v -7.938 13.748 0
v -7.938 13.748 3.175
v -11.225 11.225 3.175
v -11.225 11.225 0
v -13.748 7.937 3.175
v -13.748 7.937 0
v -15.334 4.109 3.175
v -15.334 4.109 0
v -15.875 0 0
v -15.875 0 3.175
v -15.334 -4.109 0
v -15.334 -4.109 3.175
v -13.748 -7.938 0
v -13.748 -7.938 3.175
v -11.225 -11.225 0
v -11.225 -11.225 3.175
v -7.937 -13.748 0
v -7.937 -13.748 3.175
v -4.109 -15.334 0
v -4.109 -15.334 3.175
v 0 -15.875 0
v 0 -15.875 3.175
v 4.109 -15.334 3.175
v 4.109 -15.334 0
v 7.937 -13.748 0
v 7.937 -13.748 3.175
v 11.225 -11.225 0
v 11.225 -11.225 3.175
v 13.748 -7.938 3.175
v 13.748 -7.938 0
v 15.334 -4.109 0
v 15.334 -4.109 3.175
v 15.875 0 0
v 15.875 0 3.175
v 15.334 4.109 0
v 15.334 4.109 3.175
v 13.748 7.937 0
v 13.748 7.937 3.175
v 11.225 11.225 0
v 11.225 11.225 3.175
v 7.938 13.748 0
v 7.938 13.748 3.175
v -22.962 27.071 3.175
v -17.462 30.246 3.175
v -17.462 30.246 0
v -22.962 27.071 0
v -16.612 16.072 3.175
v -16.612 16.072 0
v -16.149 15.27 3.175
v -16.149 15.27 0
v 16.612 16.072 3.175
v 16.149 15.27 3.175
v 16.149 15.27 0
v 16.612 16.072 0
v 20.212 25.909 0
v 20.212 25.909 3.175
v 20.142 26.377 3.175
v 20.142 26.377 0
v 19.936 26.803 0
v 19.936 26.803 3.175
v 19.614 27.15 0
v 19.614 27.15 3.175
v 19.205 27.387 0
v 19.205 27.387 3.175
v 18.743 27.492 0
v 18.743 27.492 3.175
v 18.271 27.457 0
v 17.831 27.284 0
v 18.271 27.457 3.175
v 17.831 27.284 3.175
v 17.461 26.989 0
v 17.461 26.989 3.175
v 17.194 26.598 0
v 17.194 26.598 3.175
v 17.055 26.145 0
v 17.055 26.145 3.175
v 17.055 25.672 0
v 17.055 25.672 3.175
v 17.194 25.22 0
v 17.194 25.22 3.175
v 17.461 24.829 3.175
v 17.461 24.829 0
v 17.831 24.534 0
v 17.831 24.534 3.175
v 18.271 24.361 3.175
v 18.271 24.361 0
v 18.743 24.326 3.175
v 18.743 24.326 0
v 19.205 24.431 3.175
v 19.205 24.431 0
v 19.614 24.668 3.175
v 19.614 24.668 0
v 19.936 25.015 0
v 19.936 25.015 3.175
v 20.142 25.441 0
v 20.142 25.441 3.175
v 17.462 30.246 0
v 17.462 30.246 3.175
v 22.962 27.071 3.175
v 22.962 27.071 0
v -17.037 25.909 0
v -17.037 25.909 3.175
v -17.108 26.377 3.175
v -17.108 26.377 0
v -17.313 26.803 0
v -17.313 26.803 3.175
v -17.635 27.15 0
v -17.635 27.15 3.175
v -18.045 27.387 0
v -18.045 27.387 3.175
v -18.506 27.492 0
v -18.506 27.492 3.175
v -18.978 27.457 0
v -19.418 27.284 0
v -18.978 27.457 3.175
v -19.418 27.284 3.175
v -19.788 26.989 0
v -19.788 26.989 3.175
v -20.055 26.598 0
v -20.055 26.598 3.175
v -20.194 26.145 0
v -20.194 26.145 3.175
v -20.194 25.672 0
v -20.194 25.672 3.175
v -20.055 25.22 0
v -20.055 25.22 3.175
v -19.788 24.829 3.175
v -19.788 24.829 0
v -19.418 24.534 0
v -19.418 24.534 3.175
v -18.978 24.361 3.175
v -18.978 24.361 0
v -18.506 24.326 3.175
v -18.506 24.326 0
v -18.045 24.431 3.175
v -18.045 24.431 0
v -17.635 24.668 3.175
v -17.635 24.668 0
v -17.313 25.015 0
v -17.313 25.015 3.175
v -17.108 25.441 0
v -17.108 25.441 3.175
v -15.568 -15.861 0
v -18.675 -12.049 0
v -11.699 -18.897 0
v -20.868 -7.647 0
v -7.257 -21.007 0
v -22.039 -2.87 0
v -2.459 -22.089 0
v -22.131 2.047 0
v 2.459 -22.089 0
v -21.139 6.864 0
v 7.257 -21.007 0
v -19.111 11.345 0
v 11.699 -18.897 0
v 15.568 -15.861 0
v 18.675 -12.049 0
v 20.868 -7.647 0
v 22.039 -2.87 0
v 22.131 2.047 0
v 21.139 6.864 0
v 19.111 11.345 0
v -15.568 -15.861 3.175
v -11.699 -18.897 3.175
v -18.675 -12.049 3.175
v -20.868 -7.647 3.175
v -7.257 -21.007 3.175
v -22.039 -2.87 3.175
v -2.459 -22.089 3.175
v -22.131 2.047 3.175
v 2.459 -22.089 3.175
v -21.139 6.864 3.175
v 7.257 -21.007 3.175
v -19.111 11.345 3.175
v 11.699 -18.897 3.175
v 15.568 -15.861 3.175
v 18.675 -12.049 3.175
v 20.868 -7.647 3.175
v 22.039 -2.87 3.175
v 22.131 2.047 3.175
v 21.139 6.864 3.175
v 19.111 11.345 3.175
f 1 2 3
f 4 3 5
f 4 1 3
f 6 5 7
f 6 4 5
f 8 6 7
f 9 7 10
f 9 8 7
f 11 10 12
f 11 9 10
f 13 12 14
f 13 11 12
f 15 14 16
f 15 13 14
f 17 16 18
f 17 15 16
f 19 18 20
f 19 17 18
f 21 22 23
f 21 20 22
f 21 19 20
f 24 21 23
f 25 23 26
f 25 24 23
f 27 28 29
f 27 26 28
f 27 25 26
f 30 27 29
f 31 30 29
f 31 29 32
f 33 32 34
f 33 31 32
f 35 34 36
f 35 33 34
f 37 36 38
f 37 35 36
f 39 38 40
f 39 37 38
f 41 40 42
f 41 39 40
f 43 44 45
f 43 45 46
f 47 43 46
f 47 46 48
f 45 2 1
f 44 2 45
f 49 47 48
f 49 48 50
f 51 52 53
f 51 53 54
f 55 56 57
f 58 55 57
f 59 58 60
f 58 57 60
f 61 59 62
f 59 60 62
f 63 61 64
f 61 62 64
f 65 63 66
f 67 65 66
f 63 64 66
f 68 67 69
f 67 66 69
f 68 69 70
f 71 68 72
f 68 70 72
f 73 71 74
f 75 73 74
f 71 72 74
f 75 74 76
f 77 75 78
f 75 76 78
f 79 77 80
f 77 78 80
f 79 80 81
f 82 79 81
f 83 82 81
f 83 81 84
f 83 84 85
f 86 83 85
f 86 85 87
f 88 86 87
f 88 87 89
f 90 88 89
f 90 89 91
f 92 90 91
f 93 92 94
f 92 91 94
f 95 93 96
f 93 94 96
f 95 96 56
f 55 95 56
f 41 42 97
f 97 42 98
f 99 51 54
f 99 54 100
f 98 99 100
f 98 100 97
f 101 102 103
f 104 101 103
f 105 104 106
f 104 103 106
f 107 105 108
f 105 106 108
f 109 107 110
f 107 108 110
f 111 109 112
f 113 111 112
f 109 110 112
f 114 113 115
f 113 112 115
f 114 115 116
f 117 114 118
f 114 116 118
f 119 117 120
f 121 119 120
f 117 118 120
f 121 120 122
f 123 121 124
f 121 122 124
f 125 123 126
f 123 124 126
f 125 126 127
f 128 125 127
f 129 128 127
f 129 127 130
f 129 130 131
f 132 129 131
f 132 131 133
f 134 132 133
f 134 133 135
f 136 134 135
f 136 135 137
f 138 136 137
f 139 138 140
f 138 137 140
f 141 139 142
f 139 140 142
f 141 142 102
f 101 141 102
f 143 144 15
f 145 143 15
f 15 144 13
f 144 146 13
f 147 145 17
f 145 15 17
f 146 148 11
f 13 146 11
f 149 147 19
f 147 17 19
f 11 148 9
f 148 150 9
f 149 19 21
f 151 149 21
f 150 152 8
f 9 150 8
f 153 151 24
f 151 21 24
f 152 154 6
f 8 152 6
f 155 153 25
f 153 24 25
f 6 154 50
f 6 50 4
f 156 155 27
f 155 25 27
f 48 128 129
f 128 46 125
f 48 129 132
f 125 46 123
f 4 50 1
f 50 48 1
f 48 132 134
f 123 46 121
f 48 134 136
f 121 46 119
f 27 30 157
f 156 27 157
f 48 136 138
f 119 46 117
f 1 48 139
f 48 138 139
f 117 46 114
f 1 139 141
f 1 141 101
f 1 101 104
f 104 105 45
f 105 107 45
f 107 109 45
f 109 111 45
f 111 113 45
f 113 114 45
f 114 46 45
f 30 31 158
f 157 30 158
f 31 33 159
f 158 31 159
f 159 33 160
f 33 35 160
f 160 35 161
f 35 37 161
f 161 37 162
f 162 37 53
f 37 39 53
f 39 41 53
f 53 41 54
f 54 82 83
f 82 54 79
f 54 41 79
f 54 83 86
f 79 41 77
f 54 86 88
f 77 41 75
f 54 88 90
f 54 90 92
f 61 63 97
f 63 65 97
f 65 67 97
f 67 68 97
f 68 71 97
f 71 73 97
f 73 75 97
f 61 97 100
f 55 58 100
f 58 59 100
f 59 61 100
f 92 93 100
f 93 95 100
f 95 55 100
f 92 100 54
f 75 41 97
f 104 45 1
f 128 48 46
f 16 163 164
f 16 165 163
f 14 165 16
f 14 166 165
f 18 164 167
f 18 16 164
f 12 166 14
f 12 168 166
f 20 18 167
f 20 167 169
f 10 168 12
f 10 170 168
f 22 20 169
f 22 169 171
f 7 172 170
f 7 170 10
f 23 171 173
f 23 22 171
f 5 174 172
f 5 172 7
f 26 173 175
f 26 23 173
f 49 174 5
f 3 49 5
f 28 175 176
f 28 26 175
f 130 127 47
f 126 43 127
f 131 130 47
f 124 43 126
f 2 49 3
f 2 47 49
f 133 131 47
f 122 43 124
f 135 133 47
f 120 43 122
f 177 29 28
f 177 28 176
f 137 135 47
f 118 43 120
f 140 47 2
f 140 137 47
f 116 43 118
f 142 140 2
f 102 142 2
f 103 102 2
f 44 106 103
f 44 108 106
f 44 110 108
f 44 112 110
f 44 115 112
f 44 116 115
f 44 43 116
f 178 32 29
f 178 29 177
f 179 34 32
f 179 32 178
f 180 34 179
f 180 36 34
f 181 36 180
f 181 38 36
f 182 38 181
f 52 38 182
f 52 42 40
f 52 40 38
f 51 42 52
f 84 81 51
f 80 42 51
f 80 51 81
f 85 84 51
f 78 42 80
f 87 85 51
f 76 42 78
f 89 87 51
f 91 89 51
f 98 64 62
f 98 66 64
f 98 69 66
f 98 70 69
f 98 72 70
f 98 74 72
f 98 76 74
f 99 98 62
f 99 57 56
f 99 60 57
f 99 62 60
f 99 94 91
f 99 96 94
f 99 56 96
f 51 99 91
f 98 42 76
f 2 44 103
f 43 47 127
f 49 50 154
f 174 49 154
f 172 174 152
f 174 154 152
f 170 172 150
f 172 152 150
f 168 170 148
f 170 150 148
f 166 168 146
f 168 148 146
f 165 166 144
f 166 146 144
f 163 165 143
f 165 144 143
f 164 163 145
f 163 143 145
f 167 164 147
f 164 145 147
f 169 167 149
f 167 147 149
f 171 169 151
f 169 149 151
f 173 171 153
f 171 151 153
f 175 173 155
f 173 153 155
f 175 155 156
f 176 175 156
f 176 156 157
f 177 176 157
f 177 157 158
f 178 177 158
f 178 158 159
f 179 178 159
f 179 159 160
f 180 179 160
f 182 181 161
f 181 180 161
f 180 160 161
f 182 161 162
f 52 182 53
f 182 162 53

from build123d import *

# Parameters (mm, degrees)
SKETCH2_R           = 22.225
SKETCH2_R_2         = 19.05
SKETCH2_R_3         = 15.875
BOSS_EXTRUDE1_DEPTH = 3.175
SKETCH3_R           = 1.5875
BOSS_EXTRUDE2_DEPTH = 3.175
CUT_EXTRUDE1_DEPTH  = 3.175


with BuildPart() as part:
    # Sketch2 → Boss-Extrude1 (new body)
    with BuildSketch(Plane.XY):
        Circle(SKETCH2_R)
        Circle(SKETCH2_R_2, mode=Mode.SUBTRACT)
        Circle(SKETCH2_R_2)
        Circle(SKETCH2_R_3, mode=Mode.SUBTRACT)
    extrude(amount=BOSS_EXTRUDE1_DEPTH)

    # Sketch3 → Boss-Extrude2 (add)
    with BuildSketch(Plane.XY.offset(3.175)):
        with BuildLine():
            ThreePointArc((-16.148535057, 15.270083186), (-13.77482484, 17.441468562), (-11.1125, 19.247414599))
            Line((-11.1125, 19.247414599), (-17.4625, 30.245937227))
            Line((-17.4625, 30.245937227), (-22.961761314, 27.070937227))
            Line((-22.961761314, 27.070937227), (-16.611761314, 16.072414599))
            Line((-16.611761314, 16.072414599), (-16.148535057, 15.270083186))
        make_face()
        with Locations((-18.624630657, 25.90880657)):
            Circle(SKETCH3_R, mode=Mode.SUBTRACT)
        with BuildLine():
            Line((17.4625, 30.245937227), (11.1125, 19.247414599))
            ThreePointArc((11.1125, 19.247414599), (13.77482484, 17.441468562), (16.148535057, 15.270083186))
            Line((16.148535057, 15.270083186), (16.611761314, 16.072414599))
            Line((16.611761314, 16.072414599), (22.961761314, 27.070937227))
            Line((22.961761314, 27.070937227), (17.4625, 30.245937227))
        make_face()
        with Locations((18.624630657, 25.90880657)):
            Circle(SKETCH3_R, mode=Mode.SUBTRACT)
    extrude(amount=-BOSS_EXTRUDE2_DEPTH)

    # Sketch5 → Cut-Extrude1 (cut)
    with BuildSketch(Plane.XY.offset(3.175)):
        with BuildLine():
            Line((-11.1125, 19.247414599), (0, 0))
            Line((0, 0), (11.1125, 19.247414599))
            ThreePointArc((11.1125, 19.247414599), (0, 22.225), (-11.1125, 19.247414599))
        make_face()
    extrude(amount=-CUT_EXTRUDE1_DEPTH, mode=Mode.SUBTRACT)


solid = part.part
